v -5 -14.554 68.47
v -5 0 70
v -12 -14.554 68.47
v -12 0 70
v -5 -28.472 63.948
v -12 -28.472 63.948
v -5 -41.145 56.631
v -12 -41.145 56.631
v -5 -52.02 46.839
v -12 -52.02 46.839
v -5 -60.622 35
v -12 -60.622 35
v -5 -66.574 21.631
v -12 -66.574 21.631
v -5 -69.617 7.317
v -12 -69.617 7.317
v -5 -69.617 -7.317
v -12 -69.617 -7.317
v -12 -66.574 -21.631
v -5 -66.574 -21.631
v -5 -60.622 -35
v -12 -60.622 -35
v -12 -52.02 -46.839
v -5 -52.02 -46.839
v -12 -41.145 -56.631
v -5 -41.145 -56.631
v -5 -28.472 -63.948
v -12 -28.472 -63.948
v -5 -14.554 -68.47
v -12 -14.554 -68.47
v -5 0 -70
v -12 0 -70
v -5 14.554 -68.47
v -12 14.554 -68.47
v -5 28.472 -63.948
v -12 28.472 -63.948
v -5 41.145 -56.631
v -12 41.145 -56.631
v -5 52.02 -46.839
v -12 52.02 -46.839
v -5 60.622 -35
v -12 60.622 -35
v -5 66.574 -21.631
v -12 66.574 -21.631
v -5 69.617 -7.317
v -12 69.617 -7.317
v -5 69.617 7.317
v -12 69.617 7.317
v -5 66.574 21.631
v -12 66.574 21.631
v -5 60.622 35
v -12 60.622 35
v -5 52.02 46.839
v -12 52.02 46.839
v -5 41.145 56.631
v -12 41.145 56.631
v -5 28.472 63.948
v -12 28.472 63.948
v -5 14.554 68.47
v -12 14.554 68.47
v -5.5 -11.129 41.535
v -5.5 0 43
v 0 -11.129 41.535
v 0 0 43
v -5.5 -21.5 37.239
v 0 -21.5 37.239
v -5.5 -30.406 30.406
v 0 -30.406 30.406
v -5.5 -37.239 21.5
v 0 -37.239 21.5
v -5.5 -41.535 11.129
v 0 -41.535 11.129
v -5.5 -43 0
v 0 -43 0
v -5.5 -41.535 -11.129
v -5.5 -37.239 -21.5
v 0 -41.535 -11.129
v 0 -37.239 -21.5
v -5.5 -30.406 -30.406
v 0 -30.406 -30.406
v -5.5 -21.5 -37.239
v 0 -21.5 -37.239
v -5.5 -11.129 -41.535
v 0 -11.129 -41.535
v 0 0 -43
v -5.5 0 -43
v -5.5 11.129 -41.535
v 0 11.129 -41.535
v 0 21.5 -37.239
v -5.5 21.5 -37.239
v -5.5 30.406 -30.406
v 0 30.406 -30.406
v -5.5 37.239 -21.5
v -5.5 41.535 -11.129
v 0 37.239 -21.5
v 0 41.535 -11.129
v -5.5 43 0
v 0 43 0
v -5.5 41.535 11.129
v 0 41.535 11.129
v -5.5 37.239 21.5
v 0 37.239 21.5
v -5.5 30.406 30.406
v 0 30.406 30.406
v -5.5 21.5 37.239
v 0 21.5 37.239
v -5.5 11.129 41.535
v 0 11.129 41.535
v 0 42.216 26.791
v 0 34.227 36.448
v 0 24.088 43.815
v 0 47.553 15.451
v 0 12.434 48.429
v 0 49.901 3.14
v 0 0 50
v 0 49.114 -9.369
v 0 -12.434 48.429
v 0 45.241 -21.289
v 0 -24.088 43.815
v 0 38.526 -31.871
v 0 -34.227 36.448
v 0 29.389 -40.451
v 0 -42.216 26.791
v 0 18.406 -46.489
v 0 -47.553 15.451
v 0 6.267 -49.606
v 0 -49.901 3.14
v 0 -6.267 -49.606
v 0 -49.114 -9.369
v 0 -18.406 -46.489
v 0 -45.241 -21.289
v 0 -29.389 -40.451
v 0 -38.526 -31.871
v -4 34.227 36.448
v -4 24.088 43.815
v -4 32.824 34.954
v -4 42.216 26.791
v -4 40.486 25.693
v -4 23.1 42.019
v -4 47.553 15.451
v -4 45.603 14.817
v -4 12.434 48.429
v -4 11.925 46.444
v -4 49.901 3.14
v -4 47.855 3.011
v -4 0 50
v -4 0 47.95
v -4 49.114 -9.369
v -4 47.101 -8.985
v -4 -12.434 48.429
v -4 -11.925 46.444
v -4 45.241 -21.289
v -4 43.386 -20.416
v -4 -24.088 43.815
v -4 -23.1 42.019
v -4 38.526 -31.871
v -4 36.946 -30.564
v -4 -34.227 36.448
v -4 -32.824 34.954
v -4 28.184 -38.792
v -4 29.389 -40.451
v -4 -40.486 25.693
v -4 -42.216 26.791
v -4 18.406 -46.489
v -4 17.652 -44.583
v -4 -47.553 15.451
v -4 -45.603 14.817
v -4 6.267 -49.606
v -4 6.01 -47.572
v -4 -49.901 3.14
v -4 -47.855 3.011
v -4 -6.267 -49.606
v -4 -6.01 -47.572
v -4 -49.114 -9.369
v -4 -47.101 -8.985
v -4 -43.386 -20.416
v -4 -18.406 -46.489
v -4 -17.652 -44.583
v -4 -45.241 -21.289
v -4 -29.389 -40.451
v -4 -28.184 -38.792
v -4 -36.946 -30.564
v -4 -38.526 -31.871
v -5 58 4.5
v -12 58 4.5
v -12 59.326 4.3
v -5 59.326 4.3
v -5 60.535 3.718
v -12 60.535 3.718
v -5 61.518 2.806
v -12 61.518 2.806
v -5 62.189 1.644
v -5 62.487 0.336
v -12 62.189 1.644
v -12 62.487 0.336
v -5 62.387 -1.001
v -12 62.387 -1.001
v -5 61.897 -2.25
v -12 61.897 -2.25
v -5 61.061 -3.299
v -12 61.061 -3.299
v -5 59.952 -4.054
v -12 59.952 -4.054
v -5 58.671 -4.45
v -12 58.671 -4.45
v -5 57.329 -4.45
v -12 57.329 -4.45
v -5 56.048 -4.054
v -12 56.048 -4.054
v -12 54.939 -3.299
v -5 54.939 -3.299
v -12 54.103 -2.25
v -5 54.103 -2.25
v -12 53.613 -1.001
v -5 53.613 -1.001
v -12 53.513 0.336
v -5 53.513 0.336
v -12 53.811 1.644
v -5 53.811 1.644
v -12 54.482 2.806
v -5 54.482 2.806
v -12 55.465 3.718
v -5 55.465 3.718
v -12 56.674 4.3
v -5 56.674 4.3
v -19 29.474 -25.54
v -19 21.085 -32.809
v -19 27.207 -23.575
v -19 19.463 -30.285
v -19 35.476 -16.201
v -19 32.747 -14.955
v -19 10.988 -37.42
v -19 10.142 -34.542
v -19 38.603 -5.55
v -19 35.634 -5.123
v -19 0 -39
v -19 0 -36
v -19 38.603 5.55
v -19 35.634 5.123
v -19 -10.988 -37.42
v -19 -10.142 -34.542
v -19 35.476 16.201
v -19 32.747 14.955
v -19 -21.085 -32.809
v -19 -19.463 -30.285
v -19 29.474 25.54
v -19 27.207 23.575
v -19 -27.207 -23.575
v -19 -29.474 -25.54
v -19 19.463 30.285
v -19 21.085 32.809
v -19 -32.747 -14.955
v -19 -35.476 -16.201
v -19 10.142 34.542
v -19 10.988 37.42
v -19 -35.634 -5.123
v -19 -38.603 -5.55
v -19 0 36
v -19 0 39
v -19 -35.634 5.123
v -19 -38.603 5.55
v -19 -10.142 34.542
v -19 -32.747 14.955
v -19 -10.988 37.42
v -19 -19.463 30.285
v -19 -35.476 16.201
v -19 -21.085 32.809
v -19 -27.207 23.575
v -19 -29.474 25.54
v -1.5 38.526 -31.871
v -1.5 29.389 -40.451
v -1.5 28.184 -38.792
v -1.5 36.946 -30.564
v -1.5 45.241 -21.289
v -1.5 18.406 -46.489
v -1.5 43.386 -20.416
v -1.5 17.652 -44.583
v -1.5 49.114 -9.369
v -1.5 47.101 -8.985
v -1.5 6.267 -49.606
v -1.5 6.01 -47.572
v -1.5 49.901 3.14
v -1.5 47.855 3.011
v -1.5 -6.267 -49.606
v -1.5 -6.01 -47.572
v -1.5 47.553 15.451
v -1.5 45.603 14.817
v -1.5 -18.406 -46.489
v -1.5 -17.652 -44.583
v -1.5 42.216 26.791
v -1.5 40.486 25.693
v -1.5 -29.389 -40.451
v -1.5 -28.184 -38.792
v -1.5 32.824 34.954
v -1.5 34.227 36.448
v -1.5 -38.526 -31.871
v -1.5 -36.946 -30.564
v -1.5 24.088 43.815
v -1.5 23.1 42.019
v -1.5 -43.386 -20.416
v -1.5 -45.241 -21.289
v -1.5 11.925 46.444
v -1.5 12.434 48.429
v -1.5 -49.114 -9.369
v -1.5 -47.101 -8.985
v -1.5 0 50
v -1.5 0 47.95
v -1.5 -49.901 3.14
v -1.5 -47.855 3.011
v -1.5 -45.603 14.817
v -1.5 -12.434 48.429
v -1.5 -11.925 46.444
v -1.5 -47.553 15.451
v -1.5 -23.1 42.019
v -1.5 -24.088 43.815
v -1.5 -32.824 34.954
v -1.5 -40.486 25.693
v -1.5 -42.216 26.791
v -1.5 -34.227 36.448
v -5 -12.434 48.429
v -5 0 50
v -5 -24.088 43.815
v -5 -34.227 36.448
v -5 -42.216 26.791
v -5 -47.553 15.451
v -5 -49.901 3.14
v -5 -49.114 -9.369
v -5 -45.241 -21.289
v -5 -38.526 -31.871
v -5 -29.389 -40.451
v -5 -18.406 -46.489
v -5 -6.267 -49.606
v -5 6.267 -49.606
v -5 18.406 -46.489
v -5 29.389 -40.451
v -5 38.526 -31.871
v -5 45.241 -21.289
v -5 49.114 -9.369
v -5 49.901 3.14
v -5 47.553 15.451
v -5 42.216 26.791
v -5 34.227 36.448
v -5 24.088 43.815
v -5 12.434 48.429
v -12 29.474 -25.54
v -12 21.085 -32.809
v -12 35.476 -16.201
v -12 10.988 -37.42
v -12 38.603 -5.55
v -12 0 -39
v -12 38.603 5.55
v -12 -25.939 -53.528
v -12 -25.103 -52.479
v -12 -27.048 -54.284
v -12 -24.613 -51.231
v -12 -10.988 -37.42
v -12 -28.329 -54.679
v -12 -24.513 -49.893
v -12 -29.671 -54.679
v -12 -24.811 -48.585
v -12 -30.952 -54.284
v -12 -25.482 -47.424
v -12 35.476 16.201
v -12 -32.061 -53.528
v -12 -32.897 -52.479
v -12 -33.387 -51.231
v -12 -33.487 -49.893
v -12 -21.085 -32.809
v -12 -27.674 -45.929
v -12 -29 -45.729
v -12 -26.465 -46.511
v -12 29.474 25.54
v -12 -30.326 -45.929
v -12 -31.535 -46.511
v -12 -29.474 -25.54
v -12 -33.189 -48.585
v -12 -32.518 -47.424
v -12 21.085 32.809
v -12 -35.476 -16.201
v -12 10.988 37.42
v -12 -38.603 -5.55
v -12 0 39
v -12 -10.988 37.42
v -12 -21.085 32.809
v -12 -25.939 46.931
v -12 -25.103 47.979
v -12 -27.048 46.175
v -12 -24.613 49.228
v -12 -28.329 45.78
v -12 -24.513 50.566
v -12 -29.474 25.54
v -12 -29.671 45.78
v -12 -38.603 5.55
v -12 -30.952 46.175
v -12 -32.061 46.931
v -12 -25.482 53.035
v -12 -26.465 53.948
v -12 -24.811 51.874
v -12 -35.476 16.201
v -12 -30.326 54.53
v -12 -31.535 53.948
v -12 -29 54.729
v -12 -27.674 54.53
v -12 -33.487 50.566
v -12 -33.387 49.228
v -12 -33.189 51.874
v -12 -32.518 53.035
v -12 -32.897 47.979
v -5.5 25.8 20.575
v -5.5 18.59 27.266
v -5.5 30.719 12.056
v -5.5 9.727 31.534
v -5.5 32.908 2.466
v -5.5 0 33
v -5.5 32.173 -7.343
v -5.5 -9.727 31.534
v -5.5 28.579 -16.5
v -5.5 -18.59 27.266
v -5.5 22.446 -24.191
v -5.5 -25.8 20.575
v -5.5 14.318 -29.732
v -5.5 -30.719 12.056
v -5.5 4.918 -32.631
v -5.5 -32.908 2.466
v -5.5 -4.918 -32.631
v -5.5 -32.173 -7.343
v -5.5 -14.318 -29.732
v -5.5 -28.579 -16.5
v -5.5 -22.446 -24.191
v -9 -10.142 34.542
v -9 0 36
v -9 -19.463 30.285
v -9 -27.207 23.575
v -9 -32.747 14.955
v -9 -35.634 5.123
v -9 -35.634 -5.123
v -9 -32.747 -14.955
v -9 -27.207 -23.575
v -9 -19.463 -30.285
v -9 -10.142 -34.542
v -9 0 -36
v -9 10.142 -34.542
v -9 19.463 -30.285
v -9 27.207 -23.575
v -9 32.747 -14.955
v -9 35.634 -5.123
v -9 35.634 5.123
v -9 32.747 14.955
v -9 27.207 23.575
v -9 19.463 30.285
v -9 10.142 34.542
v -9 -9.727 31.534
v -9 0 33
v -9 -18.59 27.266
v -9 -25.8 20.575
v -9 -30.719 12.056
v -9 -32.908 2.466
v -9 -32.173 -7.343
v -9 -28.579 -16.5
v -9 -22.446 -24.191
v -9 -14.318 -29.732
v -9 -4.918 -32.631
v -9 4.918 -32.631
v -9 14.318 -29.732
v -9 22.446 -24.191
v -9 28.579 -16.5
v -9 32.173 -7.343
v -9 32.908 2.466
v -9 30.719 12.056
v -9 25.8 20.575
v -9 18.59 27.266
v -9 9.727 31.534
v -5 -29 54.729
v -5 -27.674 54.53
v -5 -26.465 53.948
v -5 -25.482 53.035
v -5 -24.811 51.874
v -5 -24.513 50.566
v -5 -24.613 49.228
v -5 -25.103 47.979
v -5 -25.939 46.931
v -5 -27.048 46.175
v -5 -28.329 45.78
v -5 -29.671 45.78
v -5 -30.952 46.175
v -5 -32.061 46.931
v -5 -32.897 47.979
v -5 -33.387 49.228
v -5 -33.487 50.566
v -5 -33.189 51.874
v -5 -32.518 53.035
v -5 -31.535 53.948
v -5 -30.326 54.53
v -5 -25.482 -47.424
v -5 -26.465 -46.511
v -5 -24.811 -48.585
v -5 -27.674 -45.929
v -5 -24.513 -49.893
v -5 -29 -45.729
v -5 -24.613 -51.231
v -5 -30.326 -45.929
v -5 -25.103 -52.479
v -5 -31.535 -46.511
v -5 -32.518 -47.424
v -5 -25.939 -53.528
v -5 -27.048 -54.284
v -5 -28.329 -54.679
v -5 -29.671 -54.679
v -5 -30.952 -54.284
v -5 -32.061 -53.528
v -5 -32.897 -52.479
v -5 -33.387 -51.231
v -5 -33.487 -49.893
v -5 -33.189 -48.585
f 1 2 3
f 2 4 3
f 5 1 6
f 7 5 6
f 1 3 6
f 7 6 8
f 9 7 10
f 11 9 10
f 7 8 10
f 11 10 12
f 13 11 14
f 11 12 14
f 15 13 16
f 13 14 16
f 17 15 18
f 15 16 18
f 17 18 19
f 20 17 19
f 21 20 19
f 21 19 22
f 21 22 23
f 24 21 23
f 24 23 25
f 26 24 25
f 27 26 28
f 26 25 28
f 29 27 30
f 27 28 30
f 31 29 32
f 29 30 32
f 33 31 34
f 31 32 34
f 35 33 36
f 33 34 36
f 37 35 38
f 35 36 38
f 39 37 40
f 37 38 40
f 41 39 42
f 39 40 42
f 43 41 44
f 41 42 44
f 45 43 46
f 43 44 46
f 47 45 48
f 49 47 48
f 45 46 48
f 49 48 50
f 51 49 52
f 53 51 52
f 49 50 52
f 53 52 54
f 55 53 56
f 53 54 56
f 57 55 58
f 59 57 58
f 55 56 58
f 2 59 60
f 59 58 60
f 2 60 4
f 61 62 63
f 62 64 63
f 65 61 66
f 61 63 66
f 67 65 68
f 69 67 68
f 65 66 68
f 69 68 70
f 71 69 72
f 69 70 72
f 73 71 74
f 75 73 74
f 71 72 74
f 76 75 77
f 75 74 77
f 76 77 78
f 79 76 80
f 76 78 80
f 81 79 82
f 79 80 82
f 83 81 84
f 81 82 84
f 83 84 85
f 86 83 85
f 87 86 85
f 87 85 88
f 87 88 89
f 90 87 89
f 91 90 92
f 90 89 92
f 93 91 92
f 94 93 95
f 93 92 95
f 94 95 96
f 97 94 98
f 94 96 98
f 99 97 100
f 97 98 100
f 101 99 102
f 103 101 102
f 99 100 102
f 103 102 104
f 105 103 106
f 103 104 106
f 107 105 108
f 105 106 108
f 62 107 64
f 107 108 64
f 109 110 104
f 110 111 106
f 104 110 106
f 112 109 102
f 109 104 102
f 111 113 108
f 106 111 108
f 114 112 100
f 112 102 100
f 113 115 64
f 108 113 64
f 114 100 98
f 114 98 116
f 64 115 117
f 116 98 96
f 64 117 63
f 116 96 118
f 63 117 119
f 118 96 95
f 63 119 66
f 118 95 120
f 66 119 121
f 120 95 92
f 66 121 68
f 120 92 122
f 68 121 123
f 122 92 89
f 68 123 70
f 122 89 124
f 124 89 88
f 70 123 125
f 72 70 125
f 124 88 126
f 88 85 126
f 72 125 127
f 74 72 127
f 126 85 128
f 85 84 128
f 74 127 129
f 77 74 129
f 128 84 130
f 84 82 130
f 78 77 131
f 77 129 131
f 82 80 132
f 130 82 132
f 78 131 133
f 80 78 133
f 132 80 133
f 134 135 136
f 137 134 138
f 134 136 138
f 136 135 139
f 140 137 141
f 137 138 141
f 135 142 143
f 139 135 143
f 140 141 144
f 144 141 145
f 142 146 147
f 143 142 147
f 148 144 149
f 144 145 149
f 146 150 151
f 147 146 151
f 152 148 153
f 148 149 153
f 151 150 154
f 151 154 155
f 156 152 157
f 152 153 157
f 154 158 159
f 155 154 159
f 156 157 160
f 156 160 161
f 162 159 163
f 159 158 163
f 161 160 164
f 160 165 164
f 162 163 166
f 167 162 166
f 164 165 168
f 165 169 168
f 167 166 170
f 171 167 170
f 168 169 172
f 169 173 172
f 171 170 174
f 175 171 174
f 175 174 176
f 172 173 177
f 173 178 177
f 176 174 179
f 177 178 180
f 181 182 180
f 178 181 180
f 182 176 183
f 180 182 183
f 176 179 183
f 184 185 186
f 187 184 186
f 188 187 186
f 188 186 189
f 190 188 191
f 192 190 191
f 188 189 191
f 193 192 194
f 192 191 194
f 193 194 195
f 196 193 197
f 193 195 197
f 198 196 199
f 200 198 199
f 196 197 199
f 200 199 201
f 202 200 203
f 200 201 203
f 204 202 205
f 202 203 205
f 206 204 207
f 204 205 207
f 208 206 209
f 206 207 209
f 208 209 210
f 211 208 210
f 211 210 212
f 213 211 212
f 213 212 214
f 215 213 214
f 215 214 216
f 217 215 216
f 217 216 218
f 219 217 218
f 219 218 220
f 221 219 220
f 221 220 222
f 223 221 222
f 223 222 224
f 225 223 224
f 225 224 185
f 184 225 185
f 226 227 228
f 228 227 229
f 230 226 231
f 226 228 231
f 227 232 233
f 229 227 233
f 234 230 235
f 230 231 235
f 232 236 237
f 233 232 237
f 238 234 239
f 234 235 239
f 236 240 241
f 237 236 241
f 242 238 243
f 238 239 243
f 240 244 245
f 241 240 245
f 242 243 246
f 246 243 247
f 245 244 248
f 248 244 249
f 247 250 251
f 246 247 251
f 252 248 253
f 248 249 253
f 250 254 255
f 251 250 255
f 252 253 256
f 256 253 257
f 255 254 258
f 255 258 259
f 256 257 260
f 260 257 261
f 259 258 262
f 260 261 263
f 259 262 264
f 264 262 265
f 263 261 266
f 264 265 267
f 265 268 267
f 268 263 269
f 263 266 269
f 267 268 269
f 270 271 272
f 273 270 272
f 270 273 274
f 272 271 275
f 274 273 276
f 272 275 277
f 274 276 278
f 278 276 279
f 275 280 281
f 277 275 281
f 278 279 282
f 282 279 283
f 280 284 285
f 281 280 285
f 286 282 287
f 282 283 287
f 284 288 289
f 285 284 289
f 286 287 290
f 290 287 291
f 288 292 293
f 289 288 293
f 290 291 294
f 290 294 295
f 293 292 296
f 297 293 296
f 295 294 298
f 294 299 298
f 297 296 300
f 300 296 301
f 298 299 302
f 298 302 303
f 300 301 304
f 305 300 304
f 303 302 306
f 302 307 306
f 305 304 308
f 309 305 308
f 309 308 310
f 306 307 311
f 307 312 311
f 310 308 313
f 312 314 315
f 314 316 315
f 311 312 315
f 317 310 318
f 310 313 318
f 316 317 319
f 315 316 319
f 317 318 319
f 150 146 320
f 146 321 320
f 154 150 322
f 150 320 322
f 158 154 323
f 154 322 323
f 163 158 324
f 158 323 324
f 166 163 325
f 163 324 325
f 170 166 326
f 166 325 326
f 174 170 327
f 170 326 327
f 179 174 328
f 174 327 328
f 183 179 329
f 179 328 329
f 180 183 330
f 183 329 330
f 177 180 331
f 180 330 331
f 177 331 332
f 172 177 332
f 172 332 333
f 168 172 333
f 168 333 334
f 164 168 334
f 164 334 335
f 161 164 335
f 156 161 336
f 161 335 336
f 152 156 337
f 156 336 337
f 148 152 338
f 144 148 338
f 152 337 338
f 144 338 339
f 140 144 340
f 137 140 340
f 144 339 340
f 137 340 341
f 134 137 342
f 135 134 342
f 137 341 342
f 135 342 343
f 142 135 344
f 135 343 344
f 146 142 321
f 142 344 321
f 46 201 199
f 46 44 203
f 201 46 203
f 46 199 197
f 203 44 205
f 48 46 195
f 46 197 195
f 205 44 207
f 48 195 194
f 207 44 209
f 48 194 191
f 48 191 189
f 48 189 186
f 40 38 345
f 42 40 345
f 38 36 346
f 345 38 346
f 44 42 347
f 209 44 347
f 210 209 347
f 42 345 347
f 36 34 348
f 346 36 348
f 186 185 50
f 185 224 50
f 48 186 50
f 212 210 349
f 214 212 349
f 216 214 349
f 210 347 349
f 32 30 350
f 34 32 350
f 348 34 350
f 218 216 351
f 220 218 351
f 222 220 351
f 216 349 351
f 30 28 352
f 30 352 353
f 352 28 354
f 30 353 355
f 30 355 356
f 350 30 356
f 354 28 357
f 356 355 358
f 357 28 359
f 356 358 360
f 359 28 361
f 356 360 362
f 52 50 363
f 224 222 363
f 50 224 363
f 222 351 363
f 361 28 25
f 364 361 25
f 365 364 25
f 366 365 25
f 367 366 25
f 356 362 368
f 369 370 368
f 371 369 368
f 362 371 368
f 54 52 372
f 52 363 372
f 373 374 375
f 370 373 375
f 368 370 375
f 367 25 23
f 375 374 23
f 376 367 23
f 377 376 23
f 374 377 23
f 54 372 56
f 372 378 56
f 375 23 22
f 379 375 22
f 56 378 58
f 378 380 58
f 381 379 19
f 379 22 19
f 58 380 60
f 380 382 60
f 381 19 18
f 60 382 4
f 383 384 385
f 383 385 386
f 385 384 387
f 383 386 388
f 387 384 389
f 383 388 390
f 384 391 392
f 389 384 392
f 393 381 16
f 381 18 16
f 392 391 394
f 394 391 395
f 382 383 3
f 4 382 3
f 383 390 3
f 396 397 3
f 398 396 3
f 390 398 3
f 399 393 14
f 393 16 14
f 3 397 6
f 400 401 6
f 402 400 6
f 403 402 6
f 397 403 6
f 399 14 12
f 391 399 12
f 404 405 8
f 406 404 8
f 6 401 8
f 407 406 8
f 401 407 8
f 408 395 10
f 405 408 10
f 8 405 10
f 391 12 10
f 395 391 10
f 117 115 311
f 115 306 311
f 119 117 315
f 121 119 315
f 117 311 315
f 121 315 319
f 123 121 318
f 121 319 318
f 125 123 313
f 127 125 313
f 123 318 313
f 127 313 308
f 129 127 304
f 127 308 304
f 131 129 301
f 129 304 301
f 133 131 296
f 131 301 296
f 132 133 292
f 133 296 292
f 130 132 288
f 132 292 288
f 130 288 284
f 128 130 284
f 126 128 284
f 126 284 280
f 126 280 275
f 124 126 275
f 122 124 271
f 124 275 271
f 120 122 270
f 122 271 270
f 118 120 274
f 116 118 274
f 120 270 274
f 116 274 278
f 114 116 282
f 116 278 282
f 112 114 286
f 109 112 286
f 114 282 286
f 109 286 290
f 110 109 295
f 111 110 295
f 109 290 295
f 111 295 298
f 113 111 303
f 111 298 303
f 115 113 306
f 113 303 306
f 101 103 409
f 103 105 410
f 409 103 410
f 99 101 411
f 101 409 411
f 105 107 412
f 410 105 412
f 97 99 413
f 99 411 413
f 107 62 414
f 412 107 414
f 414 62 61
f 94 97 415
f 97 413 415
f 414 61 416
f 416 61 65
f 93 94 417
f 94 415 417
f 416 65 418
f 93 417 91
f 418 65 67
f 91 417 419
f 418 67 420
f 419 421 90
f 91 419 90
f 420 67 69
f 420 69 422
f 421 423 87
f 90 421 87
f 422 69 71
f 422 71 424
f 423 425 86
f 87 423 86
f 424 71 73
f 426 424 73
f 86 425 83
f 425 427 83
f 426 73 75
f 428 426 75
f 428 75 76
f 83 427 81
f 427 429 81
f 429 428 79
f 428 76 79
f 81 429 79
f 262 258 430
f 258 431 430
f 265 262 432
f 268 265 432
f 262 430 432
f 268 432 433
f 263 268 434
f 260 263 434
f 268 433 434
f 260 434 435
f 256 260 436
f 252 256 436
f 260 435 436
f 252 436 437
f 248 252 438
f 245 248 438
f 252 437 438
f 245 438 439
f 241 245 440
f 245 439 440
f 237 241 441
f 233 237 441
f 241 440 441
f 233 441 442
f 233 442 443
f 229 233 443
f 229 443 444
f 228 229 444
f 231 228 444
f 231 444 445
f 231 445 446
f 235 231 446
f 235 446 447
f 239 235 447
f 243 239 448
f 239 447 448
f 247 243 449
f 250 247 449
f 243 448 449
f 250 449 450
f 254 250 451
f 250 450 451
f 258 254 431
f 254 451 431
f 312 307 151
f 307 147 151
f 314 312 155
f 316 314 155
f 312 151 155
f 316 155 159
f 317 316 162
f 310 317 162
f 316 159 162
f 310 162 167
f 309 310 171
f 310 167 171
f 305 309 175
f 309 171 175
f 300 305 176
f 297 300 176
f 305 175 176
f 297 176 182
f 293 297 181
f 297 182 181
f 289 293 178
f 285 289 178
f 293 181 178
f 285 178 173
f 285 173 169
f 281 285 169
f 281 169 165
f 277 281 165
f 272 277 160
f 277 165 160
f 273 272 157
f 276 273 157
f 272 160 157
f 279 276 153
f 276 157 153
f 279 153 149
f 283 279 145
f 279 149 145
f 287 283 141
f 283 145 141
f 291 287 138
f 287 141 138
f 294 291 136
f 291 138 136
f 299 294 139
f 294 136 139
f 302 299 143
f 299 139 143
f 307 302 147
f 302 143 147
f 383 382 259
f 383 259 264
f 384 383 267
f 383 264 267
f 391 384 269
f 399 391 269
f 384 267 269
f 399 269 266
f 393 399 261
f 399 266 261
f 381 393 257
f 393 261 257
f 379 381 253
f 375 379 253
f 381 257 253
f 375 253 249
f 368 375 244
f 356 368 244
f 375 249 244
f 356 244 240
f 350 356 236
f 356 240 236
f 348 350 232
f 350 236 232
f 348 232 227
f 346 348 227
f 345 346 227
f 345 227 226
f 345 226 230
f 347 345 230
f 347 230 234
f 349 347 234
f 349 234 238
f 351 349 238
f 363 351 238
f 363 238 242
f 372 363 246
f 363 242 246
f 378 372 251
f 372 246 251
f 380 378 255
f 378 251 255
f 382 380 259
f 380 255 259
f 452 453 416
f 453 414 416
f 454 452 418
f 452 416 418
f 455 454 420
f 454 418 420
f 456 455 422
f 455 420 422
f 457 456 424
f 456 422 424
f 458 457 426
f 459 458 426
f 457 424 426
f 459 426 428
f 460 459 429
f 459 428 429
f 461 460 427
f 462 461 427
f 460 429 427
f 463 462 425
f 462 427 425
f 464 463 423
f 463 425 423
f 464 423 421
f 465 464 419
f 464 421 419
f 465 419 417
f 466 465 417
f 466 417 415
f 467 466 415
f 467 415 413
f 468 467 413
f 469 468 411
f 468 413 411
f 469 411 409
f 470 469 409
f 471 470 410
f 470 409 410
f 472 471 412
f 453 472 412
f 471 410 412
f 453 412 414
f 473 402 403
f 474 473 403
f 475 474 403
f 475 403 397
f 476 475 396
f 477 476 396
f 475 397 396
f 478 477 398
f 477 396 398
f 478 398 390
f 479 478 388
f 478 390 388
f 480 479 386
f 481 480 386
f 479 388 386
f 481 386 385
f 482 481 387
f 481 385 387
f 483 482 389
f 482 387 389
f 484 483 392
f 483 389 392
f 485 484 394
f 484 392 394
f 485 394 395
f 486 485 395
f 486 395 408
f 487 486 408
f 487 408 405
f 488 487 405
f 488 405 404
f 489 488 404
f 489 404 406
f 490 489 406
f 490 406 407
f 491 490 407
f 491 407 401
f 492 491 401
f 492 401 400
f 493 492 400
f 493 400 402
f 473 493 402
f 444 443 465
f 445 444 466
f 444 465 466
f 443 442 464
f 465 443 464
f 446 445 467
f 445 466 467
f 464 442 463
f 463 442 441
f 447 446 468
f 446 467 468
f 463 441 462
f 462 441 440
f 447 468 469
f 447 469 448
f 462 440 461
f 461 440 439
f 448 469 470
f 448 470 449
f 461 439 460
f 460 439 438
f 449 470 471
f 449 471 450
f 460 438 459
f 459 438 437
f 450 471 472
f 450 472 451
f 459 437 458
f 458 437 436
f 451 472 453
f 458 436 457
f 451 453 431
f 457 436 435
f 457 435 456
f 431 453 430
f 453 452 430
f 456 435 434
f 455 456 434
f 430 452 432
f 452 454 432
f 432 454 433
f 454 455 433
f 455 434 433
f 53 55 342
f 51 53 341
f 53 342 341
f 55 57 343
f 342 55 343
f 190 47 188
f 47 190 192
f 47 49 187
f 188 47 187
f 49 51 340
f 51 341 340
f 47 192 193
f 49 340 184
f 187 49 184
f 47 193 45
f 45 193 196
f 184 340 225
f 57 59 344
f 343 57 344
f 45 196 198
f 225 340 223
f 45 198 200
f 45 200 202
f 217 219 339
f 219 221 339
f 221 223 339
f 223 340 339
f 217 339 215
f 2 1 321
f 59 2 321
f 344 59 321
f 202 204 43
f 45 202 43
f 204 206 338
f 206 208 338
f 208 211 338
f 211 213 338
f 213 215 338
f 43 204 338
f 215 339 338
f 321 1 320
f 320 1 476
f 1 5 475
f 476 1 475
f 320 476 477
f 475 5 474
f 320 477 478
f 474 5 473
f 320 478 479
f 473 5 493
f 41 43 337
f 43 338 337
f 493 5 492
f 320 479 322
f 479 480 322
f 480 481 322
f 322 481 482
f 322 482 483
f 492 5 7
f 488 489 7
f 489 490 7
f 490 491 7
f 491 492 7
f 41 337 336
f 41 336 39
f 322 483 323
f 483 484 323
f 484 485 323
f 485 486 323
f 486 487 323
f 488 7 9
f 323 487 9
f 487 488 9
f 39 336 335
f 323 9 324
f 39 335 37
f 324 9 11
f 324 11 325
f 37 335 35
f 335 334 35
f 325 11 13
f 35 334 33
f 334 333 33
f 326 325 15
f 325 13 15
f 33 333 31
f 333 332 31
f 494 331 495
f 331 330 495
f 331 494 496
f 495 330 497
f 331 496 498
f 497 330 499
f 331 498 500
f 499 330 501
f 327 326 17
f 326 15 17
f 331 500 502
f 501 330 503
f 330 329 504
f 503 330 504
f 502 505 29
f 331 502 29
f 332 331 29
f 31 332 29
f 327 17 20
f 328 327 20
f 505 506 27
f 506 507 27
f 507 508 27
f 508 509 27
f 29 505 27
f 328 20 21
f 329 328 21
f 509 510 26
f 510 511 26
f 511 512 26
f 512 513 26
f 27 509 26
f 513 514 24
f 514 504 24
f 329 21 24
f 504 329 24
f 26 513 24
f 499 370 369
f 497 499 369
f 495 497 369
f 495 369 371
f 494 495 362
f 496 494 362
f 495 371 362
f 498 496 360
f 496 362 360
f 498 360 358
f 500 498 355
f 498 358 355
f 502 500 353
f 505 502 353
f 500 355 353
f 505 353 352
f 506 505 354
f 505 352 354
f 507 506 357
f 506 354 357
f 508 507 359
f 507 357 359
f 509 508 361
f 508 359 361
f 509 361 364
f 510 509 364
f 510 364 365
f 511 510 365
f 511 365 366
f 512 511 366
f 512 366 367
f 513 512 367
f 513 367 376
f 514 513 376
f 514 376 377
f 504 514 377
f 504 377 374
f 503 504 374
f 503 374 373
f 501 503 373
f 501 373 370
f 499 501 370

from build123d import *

# Parameters (mm, degrees)
SCHIZZO2_R               = 4.5
TAGLIO_ESTRUSIONE2_DEPTH = 57


with BuildPart() as part:
    # Schizzo1 → Rivoluzione1 (revolve)
    with BuildSketch(Plane.XY, mode=Mode.PRIVATE) as rivoluzione1_sk:
        Polygon((0, 43), (0, 50), (-1.5, 50), (-1.5, 47.95), (-4, 47.95), (-4, 50), (-5, 50), (-5, 70), (-12, 70), (-12, 39), (-19, 39), (-19, 36), (-9, 36), (-9, 33), (-5.5, 33), (-5.5, 43), align=None)
    revolve(rivoluzione1_sk.sketch.rotate(Axis((-54.554939241, 0, 0), (1, 0, 0)), 90), axis=Axis((-54.554939241, 0, 0), (1, 0, 0)))

    # Schizzo2 → Taglio-Estrusione2 (cut)
    with BuildSketch(Plane.ZY.offset(12)):
        with Locations((0, 58)):
            Circle(SCHIZZO2_R)
        with Locations((50.22947342, -29)):
            Circle(SCHIZZO2_R)
        with Locations((-50.229473419, -29)):
            Circle(SCHIZZO2_R)
    extrude(amount=-TAGLIO_ESTRUSIONE2_DEPTH, mode=Mode.SUBTRACT)


solid = part.part
